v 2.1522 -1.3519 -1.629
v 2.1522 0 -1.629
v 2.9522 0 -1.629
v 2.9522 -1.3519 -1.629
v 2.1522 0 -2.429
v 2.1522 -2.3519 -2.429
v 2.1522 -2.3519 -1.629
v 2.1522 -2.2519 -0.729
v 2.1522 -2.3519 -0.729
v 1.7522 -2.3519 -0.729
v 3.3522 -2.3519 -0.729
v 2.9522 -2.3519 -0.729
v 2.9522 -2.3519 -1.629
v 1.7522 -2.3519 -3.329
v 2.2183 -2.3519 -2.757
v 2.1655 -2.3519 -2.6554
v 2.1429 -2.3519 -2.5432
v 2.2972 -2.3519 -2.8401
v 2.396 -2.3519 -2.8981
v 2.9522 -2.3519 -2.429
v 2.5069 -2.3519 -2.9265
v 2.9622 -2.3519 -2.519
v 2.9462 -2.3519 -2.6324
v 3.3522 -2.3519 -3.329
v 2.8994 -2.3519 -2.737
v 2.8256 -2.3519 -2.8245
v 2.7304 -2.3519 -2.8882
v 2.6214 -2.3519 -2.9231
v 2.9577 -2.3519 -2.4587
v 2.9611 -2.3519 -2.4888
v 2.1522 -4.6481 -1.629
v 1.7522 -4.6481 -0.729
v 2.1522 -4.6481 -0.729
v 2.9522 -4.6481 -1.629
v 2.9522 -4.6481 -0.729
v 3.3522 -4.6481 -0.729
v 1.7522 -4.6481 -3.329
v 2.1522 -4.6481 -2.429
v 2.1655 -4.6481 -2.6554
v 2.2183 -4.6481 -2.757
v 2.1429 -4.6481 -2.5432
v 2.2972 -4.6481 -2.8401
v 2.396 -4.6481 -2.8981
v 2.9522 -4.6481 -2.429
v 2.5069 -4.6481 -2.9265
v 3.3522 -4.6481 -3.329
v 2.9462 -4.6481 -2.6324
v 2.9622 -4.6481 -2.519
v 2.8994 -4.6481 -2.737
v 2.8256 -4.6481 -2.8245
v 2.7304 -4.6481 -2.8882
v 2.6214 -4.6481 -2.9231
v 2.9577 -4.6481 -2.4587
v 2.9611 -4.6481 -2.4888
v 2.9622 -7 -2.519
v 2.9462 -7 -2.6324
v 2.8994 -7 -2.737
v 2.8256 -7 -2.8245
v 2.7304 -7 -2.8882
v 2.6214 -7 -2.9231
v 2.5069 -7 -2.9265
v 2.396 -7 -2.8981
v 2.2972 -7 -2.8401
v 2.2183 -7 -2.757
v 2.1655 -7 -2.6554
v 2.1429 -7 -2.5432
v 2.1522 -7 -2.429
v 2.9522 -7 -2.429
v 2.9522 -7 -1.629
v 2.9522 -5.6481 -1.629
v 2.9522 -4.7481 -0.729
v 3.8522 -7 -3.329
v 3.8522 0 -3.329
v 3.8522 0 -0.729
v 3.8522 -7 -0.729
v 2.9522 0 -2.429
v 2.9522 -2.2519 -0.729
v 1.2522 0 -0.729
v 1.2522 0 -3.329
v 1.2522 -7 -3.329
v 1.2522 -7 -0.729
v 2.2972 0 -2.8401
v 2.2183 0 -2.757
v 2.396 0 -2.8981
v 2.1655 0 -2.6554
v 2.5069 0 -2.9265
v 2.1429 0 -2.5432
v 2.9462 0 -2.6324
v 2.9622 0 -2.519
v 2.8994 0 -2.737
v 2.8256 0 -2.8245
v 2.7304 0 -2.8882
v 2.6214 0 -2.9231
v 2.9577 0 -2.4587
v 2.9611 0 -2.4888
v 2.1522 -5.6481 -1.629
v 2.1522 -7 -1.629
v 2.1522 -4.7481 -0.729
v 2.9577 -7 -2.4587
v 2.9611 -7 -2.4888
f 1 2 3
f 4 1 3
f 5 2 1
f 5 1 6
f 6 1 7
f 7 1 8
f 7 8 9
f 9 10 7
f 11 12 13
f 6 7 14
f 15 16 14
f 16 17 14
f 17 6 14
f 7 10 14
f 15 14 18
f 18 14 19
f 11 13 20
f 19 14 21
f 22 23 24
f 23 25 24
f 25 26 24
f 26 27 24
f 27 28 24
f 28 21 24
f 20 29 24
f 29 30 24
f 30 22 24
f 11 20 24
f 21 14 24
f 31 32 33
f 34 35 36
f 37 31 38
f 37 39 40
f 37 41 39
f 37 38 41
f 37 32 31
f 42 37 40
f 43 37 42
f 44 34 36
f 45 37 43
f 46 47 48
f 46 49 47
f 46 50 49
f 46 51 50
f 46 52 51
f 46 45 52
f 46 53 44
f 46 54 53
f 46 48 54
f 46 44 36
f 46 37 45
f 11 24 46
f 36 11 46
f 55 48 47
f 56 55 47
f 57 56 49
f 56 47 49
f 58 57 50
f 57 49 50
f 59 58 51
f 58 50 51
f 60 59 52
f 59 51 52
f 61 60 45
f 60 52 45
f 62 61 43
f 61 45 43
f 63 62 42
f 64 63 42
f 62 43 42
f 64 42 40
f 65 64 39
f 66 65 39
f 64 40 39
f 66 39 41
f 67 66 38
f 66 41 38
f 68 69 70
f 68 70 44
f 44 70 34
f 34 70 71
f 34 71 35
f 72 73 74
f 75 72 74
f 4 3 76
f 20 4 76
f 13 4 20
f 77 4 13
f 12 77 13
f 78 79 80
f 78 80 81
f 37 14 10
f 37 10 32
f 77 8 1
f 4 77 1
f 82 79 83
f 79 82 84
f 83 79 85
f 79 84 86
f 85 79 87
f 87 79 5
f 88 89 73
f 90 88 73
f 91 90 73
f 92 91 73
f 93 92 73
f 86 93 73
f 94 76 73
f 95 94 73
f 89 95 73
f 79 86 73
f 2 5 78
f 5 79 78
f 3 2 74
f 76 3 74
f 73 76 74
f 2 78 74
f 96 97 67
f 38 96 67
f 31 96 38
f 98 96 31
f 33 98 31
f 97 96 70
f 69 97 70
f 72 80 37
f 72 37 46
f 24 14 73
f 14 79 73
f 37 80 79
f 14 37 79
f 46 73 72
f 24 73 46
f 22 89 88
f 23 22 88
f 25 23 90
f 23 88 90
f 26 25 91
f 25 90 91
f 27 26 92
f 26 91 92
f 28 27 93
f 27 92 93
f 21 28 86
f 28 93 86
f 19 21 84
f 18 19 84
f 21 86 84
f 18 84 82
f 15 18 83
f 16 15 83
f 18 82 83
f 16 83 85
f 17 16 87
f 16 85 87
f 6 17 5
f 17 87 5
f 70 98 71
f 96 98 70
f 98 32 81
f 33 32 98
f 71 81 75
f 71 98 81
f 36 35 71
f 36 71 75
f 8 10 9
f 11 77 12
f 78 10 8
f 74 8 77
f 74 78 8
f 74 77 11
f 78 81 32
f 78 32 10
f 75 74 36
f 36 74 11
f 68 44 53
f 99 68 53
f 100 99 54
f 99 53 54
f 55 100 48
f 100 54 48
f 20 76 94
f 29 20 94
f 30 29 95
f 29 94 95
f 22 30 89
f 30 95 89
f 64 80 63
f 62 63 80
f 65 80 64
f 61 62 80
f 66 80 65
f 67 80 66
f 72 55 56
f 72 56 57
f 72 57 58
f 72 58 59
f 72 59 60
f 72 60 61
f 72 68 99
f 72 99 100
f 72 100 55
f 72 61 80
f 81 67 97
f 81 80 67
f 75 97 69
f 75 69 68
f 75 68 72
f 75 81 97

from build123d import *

# Parameters (mm, degrees)
F0_W        = 2.6
F0_H        = 2.6
F1_DEPTH    = 7
F2_W        = 1.6
F2_H        = 2.2962607759
F3_DEPTH    = 25
F4_T1_DEPTH = 0.8


# Not quite as in the source:
# - a fillet or chamfer that OpenCascade refuses, or shapes differently, is made with other operations: its cross-section is extruded or revolved along the edge and cut away or added


with BuildPart() as f1:
    # F0 (on Front) → F1 (new body)
    with BuildSketch(Plane.XZ):
        with Locations((2.5521775242, -2.0290124111)):
            Rectangle(F0_W, F0_H)
        with BuildLine():
            Line((2.1521775242, -2.4290124111), (2.1521775242, -1.6290124111))
            Line((2.1521775242, -1.6290124111), (2.9521775242, -1.6290124111))
            Line((2.9521775242, -1.6290124111), (2.9521775242, -2.4290124111))
            ThreePointArc((2.9521775242, -2.4290124111), (2.9596698554, -2.4737354854), (2.9621775242, -2.5190124111))
            ThreePointArc((2.9621775242, -2.5190124111), (2.5069005985, -2.9265047423), (2.1521775242, -2.4290124111))
        make_face(mode=Mode.SUBTRACT)
    extrude(amount=F1_DEPTH)

    # F2 (on face) → F3 (cut)
    with BuildSketch(Plane(origin=(0, 0, -3.3290124111), x_dir=(1, 0, 0), z_dir=(0, 0, -1))):
        with Locations((2.5521775242, 3.5)):
            Rectangle(F2_W, F2_H)
    extrude(amount=-F3_DEPTH, mode=Mode.SUBTRACT)

    # F4: chamfer of 1 on 2 edges, made by hand

    # F4_s2 → F4_t1 (cut)
    with BuildSketch(Plane.YZ.offset(2.1521775242)):
        Polygon((-2.351869612, -0.6290124111), (-1.351869612, -1.6290124111), (-2.351869612, -1.6290124111), align=None)
        Polygon((-4.648130388, -0.6290124111), (-5.648130388, -1.6290124111), (-4.648130388, -1.6290124111), align=None)
    extrude(amount=F4_T1_DEPTH, mode=Mode.SUBTRACT)


solid = f1.part
